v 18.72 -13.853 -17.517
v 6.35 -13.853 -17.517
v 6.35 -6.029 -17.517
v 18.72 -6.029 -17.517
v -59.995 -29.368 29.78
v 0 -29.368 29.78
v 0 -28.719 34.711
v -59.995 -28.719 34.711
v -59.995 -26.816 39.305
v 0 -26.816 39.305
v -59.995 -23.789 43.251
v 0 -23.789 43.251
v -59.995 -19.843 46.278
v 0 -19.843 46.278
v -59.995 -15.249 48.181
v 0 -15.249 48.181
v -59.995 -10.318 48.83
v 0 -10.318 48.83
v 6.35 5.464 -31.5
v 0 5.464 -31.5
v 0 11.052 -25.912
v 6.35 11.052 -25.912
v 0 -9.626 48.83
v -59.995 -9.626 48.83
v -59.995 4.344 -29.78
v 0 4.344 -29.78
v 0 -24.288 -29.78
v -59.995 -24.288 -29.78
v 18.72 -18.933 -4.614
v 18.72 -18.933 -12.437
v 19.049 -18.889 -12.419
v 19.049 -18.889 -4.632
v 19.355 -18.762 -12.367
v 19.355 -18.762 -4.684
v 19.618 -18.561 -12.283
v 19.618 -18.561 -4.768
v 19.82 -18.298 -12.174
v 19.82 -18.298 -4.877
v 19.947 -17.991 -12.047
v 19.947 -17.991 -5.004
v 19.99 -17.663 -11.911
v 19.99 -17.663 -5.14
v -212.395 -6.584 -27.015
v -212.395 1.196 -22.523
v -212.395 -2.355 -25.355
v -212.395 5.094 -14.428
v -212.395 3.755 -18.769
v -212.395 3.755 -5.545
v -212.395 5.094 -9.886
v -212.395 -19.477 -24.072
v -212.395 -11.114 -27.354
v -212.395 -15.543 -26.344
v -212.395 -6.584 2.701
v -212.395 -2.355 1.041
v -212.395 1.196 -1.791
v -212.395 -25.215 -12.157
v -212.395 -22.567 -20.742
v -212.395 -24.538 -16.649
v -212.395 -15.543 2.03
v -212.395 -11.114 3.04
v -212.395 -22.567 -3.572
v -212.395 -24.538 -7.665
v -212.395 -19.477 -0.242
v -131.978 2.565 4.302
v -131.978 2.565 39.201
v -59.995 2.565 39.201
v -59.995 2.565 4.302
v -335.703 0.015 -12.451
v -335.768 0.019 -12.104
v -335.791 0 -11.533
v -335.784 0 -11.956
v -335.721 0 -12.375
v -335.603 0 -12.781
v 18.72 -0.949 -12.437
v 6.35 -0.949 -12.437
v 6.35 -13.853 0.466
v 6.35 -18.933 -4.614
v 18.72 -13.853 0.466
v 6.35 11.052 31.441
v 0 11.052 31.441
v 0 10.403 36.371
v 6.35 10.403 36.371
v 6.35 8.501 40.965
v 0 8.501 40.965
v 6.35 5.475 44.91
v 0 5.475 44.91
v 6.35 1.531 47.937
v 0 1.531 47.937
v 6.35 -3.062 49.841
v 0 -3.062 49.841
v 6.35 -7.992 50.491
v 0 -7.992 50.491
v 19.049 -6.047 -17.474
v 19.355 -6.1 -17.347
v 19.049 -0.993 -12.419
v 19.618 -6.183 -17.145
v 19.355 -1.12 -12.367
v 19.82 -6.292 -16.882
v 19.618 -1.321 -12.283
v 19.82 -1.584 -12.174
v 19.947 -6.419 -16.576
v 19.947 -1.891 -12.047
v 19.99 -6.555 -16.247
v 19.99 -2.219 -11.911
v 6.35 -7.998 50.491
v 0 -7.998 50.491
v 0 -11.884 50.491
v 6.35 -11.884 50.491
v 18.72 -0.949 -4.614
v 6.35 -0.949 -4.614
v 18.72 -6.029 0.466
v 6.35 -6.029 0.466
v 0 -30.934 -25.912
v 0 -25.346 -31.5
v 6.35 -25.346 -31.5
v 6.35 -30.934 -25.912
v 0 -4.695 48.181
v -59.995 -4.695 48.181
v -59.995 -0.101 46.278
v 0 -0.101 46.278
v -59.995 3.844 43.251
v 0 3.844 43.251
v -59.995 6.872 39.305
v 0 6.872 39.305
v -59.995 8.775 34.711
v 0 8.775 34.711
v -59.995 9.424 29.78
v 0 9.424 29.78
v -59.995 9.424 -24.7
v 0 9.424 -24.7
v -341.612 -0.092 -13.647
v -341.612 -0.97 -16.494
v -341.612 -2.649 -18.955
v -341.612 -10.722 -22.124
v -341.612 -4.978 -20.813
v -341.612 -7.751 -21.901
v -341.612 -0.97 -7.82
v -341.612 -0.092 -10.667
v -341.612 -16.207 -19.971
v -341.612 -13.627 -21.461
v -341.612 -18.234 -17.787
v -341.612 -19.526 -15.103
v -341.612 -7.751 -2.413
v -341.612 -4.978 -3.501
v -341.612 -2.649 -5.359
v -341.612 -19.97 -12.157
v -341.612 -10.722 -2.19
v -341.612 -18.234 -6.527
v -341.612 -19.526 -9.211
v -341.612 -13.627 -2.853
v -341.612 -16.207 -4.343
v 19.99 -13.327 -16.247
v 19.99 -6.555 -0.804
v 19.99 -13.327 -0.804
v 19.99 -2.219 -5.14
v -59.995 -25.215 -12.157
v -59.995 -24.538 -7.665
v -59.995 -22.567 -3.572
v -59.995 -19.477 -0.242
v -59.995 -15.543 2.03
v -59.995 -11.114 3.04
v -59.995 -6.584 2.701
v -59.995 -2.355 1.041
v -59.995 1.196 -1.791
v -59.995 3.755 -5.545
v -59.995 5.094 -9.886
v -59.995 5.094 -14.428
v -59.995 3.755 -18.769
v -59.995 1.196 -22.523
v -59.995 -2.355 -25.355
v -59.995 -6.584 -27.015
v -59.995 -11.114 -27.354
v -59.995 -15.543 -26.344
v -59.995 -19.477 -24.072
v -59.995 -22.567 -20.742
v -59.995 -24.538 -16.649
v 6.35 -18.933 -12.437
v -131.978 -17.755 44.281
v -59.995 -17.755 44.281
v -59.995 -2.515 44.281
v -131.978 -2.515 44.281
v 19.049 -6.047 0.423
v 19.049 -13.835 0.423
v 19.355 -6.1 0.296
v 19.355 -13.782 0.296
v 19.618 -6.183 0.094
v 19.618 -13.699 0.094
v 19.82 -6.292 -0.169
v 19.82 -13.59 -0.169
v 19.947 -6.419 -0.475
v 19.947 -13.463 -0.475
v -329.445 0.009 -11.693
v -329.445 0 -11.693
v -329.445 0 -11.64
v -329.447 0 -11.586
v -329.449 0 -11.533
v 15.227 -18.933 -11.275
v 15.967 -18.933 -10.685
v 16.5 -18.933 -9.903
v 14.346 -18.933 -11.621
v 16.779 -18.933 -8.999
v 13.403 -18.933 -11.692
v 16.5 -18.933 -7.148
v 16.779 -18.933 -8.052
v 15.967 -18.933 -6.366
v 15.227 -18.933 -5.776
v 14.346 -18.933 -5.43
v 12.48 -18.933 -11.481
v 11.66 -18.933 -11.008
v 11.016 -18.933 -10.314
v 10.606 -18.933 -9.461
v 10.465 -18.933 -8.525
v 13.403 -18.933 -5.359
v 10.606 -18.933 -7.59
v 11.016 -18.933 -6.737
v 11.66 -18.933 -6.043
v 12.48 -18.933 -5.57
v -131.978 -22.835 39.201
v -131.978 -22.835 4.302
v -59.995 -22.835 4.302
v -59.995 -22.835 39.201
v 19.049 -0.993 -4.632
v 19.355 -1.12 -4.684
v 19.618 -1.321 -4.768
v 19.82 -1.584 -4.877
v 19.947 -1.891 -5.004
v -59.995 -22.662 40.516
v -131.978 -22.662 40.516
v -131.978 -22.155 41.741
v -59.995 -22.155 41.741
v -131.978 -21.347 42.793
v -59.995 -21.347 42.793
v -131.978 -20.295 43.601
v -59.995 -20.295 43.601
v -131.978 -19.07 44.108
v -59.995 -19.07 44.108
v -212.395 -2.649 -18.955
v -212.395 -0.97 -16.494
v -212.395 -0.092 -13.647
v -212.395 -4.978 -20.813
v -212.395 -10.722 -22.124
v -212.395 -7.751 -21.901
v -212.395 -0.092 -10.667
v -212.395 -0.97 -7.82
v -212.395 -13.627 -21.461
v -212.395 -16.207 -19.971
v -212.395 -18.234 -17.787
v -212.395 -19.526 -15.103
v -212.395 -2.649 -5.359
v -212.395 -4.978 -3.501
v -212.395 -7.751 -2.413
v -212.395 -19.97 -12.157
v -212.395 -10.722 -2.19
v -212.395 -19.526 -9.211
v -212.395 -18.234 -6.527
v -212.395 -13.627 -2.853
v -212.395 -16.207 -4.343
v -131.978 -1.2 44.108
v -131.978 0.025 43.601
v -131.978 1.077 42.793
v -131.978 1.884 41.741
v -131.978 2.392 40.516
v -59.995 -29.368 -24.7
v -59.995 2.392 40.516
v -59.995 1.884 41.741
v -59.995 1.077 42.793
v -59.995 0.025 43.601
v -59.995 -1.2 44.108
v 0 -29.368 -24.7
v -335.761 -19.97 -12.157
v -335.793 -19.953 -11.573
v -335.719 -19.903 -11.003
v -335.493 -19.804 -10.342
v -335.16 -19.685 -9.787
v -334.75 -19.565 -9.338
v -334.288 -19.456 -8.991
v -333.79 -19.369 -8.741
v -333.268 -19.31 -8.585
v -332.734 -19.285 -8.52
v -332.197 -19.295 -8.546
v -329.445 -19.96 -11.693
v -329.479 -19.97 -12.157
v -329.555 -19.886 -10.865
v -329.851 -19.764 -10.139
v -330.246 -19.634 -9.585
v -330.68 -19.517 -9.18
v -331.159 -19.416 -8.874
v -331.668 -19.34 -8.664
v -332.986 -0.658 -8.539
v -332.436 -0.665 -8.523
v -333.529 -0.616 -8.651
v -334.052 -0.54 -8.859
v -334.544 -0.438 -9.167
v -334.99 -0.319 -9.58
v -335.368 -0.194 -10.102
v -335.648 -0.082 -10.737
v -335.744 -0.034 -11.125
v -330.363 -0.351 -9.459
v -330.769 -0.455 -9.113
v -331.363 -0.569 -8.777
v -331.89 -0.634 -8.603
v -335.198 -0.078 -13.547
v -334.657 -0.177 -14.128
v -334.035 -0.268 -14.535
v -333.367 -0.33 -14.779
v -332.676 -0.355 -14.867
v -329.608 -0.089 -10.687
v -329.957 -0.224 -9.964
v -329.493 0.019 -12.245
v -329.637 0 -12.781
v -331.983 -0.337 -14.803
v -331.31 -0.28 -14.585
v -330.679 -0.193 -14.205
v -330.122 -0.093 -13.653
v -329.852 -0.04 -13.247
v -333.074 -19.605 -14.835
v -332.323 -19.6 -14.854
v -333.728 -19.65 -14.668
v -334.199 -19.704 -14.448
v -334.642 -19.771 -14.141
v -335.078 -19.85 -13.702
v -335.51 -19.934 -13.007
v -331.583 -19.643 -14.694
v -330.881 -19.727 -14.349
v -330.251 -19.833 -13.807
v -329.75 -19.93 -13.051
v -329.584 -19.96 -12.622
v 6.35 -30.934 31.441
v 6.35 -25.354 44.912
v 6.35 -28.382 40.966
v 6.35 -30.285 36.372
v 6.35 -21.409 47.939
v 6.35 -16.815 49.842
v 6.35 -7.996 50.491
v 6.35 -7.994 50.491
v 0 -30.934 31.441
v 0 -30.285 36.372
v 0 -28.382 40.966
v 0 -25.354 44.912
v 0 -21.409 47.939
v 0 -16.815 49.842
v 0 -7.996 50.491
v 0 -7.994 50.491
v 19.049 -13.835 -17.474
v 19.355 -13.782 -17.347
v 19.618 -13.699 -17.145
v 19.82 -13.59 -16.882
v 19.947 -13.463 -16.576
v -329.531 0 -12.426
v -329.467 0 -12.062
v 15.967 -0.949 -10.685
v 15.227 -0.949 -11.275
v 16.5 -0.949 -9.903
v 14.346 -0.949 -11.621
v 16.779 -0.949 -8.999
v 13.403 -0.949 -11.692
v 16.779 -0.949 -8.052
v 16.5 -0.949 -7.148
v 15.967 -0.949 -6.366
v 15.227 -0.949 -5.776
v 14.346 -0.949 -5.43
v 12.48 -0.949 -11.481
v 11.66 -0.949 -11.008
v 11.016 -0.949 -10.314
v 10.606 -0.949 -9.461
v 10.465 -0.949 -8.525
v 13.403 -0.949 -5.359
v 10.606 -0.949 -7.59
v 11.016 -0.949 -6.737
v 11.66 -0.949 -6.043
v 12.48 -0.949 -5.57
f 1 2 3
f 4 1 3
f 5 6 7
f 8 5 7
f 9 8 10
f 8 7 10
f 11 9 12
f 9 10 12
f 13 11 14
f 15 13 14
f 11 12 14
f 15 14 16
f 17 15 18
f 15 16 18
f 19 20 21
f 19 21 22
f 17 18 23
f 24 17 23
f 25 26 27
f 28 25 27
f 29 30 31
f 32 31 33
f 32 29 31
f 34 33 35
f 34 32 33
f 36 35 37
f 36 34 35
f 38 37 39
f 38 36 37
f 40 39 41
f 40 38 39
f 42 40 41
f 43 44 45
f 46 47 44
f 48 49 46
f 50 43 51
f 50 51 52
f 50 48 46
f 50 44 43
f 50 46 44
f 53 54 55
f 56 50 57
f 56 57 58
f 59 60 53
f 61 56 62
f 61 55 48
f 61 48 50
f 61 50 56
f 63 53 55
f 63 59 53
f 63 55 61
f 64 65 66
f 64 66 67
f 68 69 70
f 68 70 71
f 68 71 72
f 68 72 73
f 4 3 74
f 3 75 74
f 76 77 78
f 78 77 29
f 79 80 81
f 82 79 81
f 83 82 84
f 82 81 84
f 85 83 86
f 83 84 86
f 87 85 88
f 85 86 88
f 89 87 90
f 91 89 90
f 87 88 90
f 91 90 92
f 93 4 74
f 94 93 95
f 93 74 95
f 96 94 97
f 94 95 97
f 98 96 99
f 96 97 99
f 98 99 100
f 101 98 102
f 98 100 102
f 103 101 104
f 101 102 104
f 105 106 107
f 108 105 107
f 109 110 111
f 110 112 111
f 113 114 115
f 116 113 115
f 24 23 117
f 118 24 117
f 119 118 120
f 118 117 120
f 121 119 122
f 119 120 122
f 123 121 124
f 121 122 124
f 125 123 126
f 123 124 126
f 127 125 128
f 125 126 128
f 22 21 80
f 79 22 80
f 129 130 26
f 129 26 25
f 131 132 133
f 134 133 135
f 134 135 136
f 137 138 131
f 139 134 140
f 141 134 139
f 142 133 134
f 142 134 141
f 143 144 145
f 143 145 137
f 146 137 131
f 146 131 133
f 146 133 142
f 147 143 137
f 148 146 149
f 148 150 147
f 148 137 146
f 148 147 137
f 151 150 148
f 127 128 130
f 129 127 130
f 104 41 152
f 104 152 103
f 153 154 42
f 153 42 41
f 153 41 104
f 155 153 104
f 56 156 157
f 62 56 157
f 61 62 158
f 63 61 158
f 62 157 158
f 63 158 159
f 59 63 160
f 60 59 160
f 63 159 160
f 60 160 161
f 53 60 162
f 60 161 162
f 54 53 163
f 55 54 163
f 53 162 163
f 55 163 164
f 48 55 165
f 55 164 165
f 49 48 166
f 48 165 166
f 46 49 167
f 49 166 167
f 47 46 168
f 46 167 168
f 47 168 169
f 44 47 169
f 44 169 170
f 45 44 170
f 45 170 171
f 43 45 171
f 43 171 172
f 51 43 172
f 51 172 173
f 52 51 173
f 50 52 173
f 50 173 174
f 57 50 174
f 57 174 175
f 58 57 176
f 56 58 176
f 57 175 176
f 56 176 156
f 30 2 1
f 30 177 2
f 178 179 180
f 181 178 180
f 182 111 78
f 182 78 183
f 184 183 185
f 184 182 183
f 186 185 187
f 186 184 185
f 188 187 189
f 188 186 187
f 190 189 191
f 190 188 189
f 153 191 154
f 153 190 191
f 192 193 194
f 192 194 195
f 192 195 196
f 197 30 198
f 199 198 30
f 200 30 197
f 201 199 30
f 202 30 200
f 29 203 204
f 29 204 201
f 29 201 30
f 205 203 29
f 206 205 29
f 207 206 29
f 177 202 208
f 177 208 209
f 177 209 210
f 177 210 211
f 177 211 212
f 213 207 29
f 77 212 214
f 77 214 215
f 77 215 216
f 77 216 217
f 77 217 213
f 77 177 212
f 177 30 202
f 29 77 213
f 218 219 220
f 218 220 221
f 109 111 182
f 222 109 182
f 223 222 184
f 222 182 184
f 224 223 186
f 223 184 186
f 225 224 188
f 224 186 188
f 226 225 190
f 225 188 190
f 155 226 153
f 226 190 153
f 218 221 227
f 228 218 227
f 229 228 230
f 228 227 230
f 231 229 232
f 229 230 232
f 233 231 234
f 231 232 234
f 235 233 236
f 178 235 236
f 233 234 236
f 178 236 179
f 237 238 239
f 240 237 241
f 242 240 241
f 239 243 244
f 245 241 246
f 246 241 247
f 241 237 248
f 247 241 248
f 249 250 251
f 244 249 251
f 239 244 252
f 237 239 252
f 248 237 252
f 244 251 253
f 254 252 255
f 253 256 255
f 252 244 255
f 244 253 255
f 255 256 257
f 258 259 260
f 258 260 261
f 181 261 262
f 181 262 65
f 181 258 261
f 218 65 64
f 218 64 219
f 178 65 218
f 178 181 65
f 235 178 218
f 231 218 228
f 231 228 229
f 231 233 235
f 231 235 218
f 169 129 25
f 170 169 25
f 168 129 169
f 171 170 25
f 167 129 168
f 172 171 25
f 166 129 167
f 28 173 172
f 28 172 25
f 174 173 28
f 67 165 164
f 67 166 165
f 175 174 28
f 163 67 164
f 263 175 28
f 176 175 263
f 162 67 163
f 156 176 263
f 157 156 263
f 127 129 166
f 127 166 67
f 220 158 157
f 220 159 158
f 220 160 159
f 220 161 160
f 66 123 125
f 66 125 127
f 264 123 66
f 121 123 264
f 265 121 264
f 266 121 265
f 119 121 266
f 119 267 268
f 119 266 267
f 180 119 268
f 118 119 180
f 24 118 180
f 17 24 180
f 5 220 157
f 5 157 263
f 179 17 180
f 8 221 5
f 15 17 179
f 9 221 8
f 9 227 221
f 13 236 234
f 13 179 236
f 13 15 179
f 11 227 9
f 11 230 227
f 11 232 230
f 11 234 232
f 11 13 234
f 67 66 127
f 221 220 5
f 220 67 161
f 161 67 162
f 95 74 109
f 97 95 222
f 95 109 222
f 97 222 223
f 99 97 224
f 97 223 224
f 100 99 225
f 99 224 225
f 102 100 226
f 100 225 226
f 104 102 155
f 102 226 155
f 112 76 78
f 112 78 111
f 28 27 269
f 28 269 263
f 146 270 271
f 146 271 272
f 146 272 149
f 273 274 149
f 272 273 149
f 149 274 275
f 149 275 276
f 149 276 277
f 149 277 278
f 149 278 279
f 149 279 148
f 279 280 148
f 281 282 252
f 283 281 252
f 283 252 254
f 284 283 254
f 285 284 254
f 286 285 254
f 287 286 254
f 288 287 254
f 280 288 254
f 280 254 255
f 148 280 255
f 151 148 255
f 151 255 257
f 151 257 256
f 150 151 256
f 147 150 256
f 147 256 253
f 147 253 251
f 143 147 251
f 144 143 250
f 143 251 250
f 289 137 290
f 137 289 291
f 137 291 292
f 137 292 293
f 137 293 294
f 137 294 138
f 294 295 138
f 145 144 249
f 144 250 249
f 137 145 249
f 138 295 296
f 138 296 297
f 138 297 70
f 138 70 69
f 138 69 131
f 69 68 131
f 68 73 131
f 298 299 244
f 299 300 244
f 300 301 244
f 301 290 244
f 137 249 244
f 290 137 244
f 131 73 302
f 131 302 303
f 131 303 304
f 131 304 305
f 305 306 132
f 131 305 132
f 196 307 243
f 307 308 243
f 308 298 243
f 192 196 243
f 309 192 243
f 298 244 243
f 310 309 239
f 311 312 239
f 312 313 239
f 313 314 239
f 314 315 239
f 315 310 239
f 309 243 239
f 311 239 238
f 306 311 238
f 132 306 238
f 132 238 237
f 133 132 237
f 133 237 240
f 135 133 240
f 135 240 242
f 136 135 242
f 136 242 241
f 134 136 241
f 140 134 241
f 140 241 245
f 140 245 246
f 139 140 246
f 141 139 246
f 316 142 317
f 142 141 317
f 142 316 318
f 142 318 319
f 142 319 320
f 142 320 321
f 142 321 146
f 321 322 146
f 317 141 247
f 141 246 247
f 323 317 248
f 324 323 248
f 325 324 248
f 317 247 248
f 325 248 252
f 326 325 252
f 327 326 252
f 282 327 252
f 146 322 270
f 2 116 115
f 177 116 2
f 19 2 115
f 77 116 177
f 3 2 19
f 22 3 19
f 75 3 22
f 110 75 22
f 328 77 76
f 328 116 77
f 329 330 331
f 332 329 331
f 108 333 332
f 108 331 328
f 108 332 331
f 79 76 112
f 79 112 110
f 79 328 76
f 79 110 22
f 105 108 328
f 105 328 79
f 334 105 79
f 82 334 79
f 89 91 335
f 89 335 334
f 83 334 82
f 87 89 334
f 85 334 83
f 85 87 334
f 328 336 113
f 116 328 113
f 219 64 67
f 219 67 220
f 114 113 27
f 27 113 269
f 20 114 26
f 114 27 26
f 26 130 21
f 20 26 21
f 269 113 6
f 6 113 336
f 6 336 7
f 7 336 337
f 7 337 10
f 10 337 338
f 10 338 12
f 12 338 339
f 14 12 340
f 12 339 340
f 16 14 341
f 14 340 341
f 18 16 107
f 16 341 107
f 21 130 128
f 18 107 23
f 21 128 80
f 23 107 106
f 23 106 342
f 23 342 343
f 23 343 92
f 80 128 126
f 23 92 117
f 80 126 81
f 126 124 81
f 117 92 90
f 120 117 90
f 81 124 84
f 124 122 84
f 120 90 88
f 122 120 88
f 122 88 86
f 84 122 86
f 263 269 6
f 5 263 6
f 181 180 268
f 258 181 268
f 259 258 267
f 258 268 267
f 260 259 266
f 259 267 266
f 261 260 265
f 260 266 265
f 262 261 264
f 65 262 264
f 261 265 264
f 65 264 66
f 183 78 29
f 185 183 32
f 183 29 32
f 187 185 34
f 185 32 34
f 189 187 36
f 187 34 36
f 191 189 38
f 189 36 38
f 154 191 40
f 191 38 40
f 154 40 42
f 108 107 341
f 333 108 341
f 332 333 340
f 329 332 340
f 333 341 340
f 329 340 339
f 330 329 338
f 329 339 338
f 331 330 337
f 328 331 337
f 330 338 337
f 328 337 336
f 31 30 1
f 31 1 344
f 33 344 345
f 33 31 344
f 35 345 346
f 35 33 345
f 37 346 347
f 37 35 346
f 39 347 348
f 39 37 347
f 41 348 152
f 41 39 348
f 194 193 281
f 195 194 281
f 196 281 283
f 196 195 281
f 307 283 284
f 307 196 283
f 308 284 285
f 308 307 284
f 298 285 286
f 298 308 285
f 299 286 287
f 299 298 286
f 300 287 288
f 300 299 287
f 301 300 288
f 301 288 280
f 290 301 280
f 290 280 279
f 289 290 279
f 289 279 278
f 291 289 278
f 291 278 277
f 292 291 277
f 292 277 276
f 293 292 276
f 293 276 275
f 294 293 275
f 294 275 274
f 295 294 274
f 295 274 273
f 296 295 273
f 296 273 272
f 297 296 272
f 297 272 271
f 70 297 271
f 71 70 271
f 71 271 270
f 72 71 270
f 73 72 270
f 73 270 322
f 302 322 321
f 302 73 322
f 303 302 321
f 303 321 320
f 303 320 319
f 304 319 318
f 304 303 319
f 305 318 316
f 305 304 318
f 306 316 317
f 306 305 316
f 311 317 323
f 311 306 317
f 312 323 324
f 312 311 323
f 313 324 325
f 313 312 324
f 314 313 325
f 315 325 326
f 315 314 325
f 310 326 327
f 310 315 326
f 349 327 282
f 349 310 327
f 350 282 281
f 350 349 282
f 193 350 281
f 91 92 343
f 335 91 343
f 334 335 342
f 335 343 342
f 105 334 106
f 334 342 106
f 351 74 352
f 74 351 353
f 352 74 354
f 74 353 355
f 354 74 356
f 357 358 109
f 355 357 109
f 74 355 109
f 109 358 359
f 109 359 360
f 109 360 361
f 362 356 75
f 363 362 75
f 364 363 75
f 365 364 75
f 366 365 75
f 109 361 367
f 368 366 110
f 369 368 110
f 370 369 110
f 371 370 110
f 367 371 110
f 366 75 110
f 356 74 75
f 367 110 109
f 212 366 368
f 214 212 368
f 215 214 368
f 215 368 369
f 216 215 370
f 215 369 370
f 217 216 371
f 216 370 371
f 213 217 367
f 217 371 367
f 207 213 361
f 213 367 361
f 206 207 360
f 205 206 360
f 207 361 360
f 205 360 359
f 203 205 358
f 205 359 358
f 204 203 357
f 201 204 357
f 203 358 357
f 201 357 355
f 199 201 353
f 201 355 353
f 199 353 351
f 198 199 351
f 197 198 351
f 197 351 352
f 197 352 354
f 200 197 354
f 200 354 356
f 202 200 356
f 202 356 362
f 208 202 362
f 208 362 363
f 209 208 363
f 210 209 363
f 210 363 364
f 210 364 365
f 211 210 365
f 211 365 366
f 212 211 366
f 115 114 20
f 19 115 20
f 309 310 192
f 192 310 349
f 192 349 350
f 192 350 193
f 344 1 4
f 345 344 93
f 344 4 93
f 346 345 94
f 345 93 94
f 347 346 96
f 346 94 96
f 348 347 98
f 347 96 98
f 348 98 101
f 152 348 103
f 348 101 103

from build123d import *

# Parameters (mm, degrees)
F0_W      = 17.9832
F0_H      = 17.9832
F1_DEPTH  = 19.9898
F2_DEPTH  = 6.35
F3_SIZE   = 5.08
F4_R      = 3.175
F5_DEPTH  = 29.9857
F6_R      = 1.27
F8_DEPTH  = 59.9948
F9_SIZE   = 5.08
F10_SIZE  = 5.588
F12_DEPTH = 71.9836
F13_R     = 15.24
F14_DEPTH = 152.4
F15_R     = 9.9949
F16_DEPTH = 129.21676
F17_R     = 3.175
F18_DEPTH = 1.6290669181
F19_R     = 3.175
F20_DEPTH = 30.9351041637
F21_DEPTH = 11.0530958363


with BuildPart() as f1:
    # F0 (on Right) → F1 (new body)
    with BuildSketch(Plane.YZ):
        with Locations((-9.9410041637, -8.5254687518)):
            Rectangle(F0_W, F0_H)
    extrude(amount=F1_DEPTH)

    # F0 (on Right) → F2 (join)
    with BuildSketch(Plane.YZ):
        with BuildLine():
            Line((-7.9979041637, 50.4914312482), (-11.8841041637, 50.4914312482))
            ThreePointArc((-11.8841041637, 50.4914312482), (-25.3544883453, 44.9118154298), (-30.9341041637, 31.4414312482))
            Line((-30.9341041637, 31.4414312482), (-30.9341041637, -31.4997687518))
            Line((-30.9341041637, -31.4997687518), (11.0520958363, -31.4997687518))
            Line((11.0520958363, -31.4997687518), (11.0520958363, 31.4414312482))
            ThreePointArc((11.0520958363, 31.4414312482), (5.4746705554, 44.9096245359), (-7.9917078841, 50.4914302405))
            ThreePointArc((-7.9917078841, 50.4914302405), (-7.9948060239, 50.4914309962), (-7.9979041637, 50.4914312482))
        make_face()
        with Locations((-9.9410041637, -8.5254687518)):
            Rectangle(F0_W, F0_H, mode=Mode.SUBTRACT)
    extrude(amount=F2_DEPTH)

    # F3
    f3_edges = [f1.edges().sort_by_distance(p)[0] for p in [
        (13.1699, -18.932604, 0.466131),
        (13.1699, -18.932604, -17.517069),
        (13.1699, -0.949404, -17.517069),
        (13.1699, -0.949404, 0.466131),
    ]]
    chamfer(f3_edges, length=F3_SIZE)

    # F4 (on face) → F5 (cut, through all)
    with BuildSketch(Plane(origin=(0, -0.9494041637, 0), x_dir=(-1, 0, 0), z_dir=(0, 1, 0))):
        with Locations((-13.6398, -8.5254687518)):
            Circle(F4_R)
    extrude(amount=-F5_DEPTH, mode=Mode.SUBTRACT)

    # F6
    f6_edges = [f1.edges().sort_by_distance(p)[0] for p in [
        (19.9898, -9.941004, 0.466131),
        (19.9898, -3.489404, -2.073869),
        (19.9898, -16.392604, -2.073869),
        (19.9898, -0.949404, -8.525469),
        (19.9898, -18.932604, -8.525469),
        (19.9898, -3.489404, -14.977069),
        (19.9898, -16.392604, -14.977069),
        (19.9898, -9.941004, -17.517069),
    ]]
    fillet(f6_edges, radius=F6_R)

    # F7 (on face) → F8 (join)
    with BuildSketch(Plane(origin=(0, 0, 0), x_dir=(0, -1, 0), z_dir=(-1, 0, 0))):
        with BuildLine():
            Line((-9.4240289181, 29.7804048777), (-9.4240289181, -29.7799296677))
            Line((-9.4240289181, -29.7799296677), (29.3683167547, -29.7799296677))
            Line((29.3683167547, -29.7799296677), (29.3683167547, 29.7804048777))
            ThreePointArc((29.3683167547, 29.7804048777), (23.7887009363, 43.2507890593), (10.3183167547, 48.8304048777))
            Line((10.3183167547, 48.8304048777), (9.6259710819, 48.8304048777))
            ThreePointArc((9.6259710819, 48.8304048777), (-3.8444130998, 43.2507890593), (-9.4240289181, 29.7804048777))
        make_face()
    extrude(amount=F8_DEPTH)

    # F9
    f9_edges = [f1.edges().sort_by_distance(p)[0] for p in [
        (-29.9974, 9.424029, -29.77993),
        (-29.9974, -29.368317, -29.77993),
    ]]
    chamfer(f9_edges, length=F9_SIZE)

    # F10
    f10_edges = [f1.edges().sort_by_distance(p)[0] for p in [
        (3.175, -30.934104, -31.499769),
        (3.175, 11.052096, -31.499769),
    ]]
    chamfer(f10_edges, length=F10_SIZE)

    # F11 (on face) → F12 (join)
    with BuildSketch(Plane(origin=(-59.9948, 0, 0), x_dir=(0, -1, 0), z_dir=(-1, 0, 0))):
        with BuildLine():
            Line((-2.5647453316, 39.2013556009), (-2.5647453316, 4.3017556009))
            Line((-2.5647453316, 4.3017556009), (22.8352546684, 4.3017556009))
            Line((22.8352546684, 4.3017556009), (22.8352546684, 39.2013556009))
            ThreePointArc((22.8352546684, 39.2013556009), (21.3473571168, 42.7934580493), (17.7552546684, 44.2813556009))
            Line((17.7552546684, 44.2813556009), (2.5152546684, 44.2813556009))
            ThreePointArc((2.5152546684, 44.2813556009), (-1.07684778, 42.7934580493), (-2.5647453316, 39.2013556009))
        make_face()
    extrude(amount=F12_DEPTH)

    # F13 (on face) → F14 (join)
    with BuildSketch(Plane(origin=(-59.9948, 0, 0), x_dir=(0, -1, 0), z_dir=(-1, 0, 0))):
        with Locations((9.9754167547, -12.1569959447)):
            Circle(F13_R)
    extrude(amount=F14_DEPTH)

    # F17 (on face) → F18 (cut, through all)
    with BuildSketch(Plane(origin=(0, 9.4240289181, 0), x_dir=(-1, 0, 0), z_dir=(0, 1, 0))):
        with Locations((329.44496, -11.3471774384)):
            Circle(F17_R)
    extrude(amount=F18_DEPTH, mode=Mode.SUBTRACT)


with BuildPart() as f16:
    # F15 (on face) → F16 (new body)
    with BuildSketch(Plane(origin=(-212.3948, 0, 0), x_dir=(0, -1, 0), z_dir=(-1, 0, 0))):
        with Locations((9.9754167547, -12.1569959447)):
            Circle(F15_R)
    extrude(amount=F16_DEPTH)

    # F19 (on Front) → F20 (cut, through all)
    with BuildSketch(Plane.XZ):
        with Locations((-332.61996, -11.6927502677)):
            Circle(F19_R)
    extrude(amount=F20_DEPTH, mode=Mode.SUBTRACT)

    # F19 (on Front) → F21 (cut, through all)
    with BuildSketch(Plane.XZ):
        with Locations((-332.61996, -11.6927502677)):
            Circle(F19_R)
    extrude(amount=-F21_DEPTH, mode=Mode.SUBTRACT)


solid = Compound([f1.part, f16.part])
